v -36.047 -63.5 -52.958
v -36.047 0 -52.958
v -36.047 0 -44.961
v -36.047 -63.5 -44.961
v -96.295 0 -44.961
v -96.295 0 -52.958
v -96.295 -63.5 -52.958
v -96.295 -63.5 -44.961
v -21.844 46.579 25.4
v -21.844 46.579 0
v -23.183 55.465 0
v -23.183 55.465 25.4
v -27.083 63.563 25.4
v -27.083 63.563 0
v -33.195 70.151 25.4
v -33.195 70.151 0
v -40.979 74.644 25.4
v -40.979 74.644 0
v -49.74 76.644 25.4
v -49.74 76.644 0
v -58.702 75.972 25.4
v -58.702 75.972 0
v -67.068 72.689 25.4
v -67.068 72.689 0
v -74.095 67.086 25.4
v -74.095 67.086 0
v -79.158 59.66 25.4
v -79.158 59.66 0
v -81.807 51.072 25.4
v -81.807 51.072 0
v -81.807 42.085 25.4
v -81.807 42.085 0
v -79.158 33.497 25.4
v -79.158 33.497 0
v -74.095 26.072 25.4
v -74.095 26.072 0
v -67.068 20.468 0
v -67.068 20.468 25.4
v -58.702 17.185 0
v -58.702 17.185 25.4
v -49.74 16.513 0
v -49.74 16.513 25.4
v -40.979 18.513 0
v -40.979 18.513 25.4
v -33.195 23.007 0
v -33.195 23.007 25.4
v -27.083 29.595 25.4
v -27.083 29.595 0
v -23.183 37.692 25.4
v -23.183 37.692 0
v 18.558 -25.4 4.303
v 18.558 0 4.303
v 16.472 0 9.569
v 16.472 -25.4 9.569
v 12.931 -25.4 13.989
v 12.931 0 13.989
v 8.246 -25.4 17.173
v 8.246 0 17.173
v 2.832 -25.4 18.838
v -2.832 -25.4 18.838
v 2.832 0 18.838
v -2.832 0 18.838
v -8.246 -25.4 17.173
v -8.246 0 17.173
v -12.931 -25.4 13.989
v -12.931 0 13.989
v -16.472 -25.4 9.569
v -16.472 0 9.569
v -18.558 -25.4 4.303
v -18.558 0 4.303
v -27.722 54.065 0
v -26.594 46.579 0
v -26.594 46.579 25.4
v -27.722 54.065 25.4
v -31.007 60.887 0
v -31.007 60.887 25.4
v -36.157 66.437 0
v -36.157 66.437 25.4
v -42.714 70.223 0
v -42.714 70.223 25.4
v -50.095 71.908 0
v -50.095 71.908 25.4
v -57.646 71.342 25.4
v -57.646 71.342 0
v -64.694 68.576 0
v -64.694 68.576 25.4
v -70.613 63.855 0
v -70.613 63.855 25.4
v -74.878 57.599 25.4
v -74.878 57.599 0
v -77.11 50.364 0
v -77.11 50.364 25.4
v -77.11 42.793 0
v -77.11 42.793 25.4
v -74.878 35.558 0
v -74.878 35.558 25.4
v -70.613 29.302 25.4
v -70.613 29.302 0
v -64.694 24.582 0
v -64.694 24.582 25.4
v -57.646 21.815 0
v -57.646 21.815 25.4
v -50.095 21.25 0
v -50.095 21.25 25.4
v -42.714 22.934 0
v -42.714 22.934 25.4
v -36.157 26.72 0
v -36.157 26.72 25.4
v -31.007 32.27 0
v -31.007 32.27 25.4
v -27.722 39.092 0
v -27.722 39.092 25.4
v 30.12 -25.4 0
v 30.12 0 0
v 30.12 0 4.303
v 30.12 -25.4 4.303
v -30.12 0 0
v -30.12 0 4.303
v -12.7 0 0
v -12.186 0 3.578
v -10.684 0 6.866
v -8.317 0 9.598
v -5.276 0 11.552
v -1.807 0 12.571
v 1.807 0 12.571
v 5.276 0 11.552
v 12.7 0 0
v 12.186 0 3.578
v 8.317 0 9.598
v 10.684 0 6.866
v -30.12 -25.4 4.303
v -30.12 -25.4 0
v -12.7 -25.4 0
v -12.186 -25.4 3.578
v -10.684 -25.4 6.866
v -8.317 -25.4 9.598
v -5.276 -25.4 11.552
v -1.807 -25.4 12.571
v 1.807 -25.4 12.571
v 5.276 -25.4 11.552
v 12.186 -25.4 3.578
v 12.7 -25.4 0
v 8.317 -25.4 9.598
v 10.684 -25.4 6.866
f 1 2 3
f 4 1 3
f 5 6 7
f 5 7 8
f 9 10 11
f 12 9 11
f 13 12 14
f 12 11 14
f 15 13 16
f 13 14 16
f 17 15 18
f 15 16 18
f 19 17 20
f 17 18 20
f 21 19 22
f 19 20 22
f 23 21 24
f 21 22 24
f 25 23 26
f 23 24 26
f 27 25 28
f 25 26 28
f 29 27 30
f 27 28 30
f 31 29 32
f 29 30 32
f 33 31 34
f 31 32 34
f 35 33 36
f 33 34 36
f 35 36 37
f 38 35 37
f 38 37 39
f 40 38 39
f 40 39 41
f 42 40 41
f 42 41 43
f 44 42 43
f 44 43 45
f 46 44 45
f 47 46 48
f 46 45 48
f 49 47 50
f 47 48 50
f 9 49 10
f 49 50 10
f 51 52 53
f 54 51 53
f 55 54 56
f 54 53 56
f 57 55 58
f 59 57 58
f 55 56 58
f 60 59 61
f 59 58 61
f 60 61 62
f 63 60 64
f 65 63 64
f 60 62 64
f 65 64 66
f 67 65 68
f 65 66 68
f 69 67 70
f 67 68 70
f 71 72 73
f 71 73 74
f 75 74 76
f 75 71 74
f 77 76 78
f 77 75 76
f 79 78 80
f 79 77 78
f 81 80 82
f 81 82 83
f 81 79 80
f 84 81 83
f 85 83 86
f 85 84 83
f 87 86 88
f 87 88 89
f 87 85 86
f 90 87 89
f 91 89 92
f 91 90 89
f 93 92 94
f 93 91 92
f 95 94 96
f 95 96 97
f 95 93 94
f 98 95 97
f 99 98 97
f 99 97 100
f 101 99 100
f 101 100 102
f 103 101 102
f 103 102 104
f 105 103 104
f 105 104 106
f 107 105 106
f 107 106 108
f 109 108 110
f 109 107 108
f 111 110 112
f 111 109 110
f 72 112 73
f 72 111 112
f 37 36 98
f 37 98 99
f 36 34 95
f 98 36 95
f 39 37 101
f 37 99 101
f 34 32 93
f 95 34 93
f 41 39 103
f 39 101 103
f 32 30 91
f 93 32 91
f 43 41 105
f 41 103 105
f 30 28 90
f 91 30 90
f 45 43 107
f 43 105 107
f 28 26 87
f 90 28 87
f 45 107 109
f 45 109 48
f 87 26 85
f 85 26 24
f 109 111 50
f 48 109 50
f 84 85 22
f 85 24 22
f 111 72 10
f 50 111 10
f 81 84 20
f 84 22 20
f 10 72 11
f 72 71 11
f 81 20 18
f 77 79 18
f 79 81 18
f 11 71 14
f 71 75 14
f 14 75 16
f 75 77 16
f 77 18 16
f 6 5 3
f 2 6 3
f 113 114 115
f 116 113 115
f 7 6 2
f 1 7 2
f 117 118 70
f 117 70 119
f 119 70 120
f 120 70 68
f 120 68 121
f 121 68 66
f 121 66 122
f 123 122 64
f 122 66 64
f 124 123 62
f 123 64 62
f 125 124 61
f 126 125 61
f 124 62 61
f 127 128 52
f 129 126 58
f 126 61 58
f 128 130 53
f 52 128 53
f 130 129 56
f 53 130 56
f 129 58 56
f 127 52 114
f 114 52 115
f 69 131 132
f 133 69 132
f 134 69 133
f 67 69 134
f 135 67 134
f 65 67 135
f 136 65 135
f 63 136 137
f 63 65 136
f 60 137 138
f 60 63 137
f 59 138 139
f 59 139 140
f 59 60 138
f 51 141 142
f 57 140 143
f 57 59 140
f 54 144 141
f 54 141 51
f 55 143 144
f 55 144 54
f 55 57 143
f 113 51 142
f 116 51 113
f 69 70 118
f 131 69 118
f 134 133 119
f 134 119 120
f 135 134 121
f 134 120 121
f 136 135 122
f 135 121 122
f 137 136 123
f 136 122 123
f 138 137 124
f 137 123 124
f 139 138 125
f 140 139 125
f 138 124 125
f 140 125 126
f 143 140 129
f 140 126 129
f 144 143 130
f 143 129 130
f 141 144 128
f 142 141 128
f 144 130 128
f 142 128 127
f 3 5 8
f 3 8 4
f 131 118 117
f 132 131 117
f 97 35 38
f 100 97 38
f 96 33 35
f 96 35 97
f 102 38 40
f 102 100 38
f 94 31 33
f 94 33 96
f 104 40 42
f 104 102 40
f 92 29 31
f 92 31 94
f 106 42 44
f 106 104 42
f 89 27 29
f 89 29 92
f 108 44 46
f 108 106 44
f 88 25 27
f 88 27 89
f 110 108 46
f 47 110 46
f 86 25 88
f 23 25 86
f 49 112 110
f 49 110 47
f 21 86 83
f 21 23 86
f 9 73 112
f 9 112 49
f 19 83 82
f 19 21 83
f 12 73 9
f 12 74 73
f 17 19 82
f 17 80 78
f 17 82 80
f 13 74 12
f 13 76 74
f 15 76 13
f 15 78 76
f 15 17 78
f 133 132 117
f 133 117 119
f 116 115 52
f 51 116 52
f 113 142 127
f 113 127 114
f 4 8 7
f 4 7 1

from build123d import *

# Parameters (mm, degrees)
F1_DEPTH = 25.4
F2_W     = 60.2488
F2_H     = 7.997628
F3_DEPTH = 63.5
F4_R     = 30.1498
F4_R_2   = 25.4
F5_DEPTH = 25.4


with BuildPart() as f1:
    # F0 (on Front) → F1 (new body)
    with BuildSketch(Plane.XZ):
        with BuildLine():
            ThreePointArc((-12.7, 0), (0, 12.7), (12.7, 0))
            Line((12.7, 0), (30.120043, 0))
            Line((30.120043, 0), (30.120043, 4.302863))
            Line((30.120043, 4.302863), (18.55769, 4.302863))
            ThreePointArc((18.55769, 4.302863), (0, 19.05), (-18.55769, 4.302863))
            Line((-18.55769, 4.302863), (-30.120043, 4.302863))
            Line((-30.120043, 4.302863), (-30.120043, 0))
            Line((-30.120043, 0), (-12.7, 0))
        make_face()
    extrude(amount=F1_DEPTH)


with BuildPart() as f3:
    # F2 (on Front) → F3 (new body)
    with BuildSketch(Plane.XZ):
        with Locations((-66.171065, -48.959609)):
            Rectangle(F2_W, F2_H)
    extrude(amount=F3_DEPTH)


with BuildPart() as f5:
    # F4 (on Top) → F5 (new body)
    with BuildSketch(Plane.XY):
        with Locations((-51.993508, 46.578594)):
            Circle(F4_R)
        with Locations((-51.993508, 46.578594)):
            Circle(F4_R_2, mode=Mode.SUBTRACT)
    extrude(amount=F5_DEPTH)


solid = Compound([f1.part, f3.part, f5.part])
